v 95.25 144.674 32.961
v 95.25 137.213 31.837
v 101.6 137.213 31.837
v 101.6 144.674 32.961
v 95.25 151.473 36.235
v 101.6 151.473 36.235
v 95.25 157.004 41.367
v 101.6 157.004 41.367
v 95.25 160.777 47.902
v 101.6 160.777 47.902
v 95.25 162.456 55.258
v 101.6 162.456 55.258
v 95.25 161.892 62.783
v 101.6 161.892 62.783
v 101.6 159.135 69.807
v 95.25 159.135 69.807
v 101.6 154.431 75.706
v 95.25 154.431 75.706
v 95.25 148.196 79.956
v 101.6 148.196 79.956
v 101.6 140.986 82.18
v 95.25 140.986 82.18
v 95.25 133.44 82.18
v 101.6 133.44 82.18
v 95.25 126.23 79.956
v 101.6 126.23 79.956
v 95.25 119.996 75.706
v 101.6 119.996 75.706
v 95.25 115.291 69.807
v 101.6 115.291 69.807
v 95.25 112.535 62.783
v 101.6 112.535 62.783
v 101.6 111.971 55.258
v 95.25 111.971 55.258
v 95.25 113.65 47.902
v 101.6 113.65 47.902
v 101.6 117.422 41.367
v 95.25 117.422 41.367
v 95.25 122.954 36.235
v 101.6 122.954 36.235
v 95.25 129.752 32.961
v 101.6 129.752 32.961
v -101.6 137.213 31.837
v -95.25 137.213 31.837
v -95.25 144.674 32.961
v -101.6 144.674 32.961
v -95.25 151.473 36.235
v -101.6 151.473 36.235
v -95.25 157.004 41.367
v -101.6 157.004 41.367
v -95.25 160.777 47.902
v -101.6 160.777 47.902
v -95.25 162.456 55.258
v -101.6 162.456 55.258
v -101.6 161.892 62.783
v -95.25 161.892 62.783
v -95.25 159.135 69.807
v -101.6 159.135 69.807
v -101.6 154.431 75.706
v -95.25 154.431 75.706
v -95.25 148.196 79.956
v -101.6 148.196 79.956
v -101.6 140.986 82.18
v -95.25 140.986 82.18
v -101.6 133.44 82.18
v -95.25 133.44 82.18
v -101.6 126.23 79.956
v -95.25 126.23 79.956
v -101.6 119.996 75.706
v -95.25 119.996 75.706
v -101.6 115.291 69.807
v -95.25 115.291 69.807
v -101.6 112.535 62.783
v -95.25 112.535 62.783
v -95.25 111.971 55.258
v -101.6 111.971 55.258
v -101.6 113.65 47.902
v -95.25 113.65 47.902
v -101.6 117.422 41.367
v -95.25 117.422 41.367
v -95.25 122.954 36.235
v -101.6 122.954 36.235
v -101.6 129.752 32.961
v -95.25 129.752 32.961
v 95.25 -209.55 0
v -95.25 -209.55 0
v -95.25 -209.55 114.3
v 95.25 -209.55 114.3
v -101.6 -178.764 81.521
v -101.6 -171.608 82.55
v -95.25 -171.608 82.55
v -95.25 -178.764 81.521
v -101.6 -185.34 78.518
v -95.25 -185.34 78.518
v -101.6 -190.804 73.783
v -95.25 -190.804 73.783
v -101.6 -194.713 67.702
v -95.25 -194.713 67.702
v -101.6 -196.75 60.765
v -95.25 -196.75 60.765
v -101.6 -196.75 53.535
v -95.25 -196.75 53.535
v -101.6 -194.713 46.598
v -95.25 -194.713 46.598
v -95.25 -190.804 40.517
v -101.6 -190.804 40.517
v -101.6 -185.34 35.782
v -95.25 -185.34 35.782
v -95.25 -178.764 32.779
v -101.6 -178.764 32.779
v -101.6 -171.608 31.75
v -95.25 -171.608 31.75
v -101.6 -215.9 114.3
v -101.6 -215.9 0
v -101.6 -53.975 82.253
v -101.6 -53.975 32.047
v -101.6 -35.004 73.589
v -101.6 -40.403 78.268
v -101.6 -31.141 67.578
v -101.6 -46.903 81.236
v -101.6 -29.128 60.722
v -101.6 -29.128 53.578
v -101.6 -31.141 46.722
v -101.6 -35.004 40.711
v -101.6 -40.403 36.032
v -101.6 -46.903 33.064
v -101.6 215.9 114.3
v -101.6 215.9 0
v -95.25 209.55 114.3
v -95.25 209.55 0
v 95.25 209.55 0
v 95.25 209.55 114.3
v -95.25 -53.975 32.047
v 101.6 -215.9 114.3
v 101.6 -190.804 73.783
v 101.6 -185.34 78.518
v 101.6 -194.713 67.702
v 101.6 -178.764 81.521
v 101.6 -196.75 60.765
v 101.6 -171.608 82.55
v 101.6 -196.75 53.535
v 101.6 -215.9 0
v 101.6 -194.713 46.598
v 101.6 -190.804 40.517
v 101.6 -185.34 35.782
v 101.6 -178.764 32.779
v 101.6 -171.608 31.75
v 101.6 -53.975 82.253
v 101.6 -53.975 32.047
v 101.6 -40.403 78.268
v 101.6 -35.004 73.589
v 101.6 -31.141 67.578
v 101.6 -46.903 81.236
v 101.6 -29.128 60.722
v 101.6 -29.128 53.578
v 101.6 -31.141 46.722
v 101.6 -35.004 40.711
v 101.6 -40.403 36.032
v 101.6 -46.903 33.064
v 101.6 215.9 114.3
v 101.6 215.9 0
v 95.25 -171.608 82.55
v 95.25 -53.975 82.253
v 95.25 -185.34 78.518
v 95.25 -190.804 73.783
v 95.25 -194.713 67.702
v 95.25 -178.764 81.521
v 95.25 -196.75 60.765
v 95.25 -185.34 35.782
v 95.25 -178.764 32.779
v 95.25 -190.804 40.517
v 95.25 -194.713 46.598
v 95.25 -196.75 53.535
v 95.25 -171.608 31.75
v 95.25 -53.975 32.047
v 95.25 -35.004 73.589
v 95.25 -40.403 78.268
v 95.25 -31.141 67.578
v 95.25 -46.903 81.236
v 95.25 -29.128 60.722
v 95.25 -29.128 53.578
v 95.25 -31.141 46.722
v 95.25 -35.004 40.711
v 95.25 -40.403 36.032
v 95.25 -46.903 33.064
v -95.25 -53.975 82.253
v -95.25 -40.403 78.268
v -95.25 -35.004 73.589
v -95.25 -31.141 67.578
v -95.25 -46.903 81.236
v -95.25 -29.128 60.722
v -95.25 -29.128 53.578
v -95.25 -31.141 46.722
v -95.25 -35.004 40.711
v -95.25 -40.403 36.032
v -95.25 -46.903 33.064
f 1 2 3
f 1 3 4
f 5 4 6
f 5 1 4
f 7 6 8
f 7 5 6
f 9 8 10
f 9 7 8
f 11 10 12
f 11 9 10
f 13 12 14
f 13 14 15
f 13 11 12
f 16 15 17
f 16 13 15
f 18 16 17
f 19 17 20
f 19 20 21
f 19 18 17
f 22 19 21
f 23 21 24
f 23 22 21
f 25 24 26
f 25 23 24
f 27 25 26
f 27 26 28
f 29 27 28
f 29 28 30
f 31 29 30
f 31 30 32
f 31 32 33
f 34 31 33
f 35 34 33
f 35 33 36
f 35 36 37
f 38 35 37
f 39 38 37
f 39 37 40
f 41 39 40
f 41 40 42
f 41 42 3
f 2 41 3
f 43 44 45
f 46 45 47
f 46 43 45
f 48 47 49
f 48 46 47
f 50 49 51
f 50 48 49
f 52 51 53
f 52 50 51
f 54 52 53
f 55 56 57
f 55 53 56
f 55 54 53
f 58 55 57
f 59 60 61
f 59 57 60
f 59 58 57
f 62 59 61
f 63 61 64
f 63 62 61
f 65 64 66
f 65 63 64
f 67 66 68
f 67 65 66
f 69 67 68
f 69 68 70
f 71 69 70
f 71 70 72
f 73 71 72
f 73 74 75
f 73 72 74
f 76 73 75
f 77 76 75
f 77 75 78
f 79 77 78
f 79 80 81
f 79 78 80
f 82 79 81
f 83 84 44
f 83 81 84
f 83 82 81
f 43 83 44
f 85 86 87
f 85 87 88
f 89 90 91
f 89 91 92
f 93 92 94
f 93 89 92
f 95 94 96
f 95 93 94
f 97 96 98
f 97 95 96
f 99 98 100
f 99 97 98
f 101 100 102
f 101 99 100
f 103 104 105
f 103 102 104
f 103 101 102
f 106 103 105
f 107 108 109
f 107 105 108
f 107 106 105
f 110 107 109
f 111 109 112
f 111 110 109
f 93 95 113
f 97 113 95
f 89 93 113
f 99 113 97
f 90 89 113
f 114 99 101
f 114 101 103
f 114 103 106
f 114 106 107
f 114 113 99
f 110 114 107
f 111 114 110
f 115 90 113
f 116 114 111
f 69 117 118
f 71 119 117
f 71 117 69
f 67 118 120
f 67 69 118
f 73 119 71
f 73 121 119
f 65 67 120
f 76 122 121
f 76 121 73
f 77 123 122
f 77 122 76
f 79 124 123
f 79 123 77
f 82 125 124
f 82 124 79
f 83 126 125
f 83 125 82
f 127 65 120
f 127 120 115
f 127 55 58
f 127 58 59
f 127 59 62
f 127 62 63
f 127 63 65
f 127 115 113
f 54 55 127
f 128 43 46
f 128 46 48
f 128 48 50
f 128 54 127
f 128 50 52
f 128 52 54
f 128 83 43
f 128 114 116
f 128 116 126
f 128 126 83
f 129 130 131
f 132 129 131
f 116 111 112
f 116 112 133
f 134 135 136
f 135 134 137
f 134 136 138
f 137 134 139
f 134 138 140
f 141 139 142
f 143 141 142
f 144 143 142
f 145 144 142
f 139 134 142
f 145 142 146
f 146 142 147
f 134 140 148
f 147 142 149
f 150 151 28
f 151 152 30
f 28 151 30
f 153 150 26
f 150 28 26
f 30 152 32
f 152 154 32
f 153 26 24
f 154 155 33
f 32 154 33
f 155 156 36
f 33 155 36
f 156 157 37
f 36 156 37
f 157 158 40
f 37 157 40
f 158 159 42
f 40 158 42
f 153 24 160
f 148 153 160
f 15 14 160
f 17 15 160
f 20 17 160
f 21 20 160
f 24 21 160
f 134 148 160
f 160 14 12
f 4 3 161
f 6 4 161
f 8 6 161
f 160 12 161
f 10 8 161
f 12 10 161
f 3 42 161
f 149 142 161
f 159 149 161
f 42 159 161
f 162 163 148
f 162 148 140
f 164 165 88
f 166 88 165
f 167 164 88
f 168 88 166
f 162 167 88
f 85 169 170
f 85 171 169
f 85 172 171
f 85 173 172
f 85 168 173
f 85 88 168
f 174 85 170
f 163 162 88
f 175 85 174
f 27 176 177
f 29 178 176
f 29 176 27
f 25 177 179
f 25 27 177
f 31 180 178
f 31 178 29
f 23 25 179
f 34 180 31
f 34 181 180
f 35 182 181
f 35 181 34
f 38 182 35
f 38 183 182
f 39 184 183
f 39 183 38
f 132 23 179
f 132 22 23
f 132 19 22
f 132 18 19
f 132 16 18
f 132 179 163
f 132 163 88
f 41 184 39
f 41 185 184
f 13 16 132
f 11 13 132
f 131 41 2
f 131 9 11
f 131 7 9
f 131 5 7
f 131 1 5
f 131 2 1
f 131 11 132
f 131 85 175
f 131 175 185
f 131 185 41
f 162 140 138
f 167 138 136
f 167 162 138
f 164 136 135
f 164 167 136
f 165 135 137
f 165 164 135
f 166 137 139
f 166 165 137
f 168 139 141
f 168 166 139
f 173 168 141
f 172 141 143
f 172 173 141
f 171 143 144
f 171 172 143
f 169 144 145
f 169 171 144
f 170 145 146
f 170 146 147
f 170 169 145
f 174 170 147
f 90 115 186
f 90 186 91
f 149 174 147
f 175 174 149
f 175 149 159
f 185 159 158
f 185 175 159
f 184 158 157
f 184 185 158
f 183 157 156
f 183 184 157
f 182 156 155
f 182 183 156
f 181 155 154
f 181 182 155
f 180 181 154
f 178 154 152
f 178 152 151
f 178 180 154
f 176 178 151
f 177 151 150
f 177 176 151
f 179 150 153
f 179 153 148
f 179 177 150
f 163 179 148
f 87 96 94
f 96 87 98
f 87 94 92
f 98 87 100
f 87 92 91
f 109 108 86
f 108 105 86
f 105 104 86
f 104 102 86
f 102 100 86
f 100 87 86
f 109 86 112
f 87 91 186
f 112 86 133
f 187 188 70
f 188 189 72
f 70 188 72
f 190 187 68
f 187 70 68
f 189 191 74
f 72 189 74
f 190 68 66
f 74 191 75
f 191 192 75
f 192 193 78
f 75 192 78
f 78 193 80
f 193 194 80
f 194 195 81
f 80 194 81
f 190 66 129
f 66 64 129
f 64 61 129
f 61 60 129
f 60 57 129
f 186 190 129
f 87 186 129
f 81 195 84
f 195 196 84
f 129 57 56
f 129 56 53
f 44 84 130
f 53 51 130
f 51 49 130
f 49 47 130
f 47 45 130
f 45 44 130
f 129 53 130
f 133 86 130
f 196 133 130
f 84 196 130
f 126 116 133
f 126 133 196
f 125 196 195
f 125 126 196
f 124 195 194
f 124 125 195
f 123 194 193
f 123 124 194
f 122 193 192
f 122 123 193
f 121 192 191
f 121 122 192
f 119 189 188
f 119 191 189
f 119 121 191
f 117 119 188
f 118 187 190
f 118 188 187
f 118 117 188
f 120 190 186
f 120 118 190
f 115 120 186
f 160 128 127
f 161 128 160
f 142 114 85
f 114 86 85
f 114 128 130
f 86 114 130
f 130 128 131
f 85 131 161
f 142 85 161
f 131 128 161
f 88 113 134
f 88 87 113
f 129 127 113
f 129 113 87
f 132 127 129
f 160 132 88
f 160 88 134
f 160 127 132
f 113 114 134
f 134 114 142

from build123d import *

# Parameters (mm, degrees)
SKETCH1_W               = 203.2
SKETCH1_H               = 431.8
SKETCH1_W_2             = 190.5
SKETCH1_H_2             = 419.1
BOSS_EXTRUDE4_DEPTH     = 114.3
CUT_EXTRUDE3_DEPTH      = 141.986
CUT_EXTRUDE3_DEPTH_BACK = 204.216
SKETCH4_R               = 25.313218752


with BuildPart() as part:
    # Sketch1 → Boss-Extrude4 (new body)
    with BuildSketch(Plane.XY):
        Rectangle(SKETCH1_W, SKETCH1_H)
        Rectangle(SKETCH1_W_2, SKETCH1_H_2, mode=Mode.SUBTRACT)
    extrude(amount=BOSS_EXTRUDE4_DEPTH)

    # Sketch4 → Cut-Extrude3 (cut, two sides: drawn at the far end of the back side and taken through both)
    with BuildSketch(Plane(origin=(0, 0, 0), x_dir=(0, 0, -1), z_dir=(1, 0, 0)).offset(-CUT_EXTRUDE3_DEPTH_BACK)):
        with BuildLine():
            ThreePointArc((-32.047357803, -53.975), (-57.15, -28.872357803), (-82.252642197, -53.975))
            Line((-82.252642197, -53.975), (-82.55, -171.608124436))
            ThreePointArc((-82.55, -171.608124436), (-57.15, -197.008124436), (-31.75, -171.608124436))
            Line((-31.75, -171.608124436), (-32.047357803, -53.975))
        make_face()
        with Locations((-57.15, 137.213144343)):
            Circle(SKETCH4_R)
    extrude(amount=CUT_EXTRUDE3_DEPTH + CUT_EXTRUDE3_DEPTH_BACK, mode=Mode.SUBTRACT)


solid = part.part
